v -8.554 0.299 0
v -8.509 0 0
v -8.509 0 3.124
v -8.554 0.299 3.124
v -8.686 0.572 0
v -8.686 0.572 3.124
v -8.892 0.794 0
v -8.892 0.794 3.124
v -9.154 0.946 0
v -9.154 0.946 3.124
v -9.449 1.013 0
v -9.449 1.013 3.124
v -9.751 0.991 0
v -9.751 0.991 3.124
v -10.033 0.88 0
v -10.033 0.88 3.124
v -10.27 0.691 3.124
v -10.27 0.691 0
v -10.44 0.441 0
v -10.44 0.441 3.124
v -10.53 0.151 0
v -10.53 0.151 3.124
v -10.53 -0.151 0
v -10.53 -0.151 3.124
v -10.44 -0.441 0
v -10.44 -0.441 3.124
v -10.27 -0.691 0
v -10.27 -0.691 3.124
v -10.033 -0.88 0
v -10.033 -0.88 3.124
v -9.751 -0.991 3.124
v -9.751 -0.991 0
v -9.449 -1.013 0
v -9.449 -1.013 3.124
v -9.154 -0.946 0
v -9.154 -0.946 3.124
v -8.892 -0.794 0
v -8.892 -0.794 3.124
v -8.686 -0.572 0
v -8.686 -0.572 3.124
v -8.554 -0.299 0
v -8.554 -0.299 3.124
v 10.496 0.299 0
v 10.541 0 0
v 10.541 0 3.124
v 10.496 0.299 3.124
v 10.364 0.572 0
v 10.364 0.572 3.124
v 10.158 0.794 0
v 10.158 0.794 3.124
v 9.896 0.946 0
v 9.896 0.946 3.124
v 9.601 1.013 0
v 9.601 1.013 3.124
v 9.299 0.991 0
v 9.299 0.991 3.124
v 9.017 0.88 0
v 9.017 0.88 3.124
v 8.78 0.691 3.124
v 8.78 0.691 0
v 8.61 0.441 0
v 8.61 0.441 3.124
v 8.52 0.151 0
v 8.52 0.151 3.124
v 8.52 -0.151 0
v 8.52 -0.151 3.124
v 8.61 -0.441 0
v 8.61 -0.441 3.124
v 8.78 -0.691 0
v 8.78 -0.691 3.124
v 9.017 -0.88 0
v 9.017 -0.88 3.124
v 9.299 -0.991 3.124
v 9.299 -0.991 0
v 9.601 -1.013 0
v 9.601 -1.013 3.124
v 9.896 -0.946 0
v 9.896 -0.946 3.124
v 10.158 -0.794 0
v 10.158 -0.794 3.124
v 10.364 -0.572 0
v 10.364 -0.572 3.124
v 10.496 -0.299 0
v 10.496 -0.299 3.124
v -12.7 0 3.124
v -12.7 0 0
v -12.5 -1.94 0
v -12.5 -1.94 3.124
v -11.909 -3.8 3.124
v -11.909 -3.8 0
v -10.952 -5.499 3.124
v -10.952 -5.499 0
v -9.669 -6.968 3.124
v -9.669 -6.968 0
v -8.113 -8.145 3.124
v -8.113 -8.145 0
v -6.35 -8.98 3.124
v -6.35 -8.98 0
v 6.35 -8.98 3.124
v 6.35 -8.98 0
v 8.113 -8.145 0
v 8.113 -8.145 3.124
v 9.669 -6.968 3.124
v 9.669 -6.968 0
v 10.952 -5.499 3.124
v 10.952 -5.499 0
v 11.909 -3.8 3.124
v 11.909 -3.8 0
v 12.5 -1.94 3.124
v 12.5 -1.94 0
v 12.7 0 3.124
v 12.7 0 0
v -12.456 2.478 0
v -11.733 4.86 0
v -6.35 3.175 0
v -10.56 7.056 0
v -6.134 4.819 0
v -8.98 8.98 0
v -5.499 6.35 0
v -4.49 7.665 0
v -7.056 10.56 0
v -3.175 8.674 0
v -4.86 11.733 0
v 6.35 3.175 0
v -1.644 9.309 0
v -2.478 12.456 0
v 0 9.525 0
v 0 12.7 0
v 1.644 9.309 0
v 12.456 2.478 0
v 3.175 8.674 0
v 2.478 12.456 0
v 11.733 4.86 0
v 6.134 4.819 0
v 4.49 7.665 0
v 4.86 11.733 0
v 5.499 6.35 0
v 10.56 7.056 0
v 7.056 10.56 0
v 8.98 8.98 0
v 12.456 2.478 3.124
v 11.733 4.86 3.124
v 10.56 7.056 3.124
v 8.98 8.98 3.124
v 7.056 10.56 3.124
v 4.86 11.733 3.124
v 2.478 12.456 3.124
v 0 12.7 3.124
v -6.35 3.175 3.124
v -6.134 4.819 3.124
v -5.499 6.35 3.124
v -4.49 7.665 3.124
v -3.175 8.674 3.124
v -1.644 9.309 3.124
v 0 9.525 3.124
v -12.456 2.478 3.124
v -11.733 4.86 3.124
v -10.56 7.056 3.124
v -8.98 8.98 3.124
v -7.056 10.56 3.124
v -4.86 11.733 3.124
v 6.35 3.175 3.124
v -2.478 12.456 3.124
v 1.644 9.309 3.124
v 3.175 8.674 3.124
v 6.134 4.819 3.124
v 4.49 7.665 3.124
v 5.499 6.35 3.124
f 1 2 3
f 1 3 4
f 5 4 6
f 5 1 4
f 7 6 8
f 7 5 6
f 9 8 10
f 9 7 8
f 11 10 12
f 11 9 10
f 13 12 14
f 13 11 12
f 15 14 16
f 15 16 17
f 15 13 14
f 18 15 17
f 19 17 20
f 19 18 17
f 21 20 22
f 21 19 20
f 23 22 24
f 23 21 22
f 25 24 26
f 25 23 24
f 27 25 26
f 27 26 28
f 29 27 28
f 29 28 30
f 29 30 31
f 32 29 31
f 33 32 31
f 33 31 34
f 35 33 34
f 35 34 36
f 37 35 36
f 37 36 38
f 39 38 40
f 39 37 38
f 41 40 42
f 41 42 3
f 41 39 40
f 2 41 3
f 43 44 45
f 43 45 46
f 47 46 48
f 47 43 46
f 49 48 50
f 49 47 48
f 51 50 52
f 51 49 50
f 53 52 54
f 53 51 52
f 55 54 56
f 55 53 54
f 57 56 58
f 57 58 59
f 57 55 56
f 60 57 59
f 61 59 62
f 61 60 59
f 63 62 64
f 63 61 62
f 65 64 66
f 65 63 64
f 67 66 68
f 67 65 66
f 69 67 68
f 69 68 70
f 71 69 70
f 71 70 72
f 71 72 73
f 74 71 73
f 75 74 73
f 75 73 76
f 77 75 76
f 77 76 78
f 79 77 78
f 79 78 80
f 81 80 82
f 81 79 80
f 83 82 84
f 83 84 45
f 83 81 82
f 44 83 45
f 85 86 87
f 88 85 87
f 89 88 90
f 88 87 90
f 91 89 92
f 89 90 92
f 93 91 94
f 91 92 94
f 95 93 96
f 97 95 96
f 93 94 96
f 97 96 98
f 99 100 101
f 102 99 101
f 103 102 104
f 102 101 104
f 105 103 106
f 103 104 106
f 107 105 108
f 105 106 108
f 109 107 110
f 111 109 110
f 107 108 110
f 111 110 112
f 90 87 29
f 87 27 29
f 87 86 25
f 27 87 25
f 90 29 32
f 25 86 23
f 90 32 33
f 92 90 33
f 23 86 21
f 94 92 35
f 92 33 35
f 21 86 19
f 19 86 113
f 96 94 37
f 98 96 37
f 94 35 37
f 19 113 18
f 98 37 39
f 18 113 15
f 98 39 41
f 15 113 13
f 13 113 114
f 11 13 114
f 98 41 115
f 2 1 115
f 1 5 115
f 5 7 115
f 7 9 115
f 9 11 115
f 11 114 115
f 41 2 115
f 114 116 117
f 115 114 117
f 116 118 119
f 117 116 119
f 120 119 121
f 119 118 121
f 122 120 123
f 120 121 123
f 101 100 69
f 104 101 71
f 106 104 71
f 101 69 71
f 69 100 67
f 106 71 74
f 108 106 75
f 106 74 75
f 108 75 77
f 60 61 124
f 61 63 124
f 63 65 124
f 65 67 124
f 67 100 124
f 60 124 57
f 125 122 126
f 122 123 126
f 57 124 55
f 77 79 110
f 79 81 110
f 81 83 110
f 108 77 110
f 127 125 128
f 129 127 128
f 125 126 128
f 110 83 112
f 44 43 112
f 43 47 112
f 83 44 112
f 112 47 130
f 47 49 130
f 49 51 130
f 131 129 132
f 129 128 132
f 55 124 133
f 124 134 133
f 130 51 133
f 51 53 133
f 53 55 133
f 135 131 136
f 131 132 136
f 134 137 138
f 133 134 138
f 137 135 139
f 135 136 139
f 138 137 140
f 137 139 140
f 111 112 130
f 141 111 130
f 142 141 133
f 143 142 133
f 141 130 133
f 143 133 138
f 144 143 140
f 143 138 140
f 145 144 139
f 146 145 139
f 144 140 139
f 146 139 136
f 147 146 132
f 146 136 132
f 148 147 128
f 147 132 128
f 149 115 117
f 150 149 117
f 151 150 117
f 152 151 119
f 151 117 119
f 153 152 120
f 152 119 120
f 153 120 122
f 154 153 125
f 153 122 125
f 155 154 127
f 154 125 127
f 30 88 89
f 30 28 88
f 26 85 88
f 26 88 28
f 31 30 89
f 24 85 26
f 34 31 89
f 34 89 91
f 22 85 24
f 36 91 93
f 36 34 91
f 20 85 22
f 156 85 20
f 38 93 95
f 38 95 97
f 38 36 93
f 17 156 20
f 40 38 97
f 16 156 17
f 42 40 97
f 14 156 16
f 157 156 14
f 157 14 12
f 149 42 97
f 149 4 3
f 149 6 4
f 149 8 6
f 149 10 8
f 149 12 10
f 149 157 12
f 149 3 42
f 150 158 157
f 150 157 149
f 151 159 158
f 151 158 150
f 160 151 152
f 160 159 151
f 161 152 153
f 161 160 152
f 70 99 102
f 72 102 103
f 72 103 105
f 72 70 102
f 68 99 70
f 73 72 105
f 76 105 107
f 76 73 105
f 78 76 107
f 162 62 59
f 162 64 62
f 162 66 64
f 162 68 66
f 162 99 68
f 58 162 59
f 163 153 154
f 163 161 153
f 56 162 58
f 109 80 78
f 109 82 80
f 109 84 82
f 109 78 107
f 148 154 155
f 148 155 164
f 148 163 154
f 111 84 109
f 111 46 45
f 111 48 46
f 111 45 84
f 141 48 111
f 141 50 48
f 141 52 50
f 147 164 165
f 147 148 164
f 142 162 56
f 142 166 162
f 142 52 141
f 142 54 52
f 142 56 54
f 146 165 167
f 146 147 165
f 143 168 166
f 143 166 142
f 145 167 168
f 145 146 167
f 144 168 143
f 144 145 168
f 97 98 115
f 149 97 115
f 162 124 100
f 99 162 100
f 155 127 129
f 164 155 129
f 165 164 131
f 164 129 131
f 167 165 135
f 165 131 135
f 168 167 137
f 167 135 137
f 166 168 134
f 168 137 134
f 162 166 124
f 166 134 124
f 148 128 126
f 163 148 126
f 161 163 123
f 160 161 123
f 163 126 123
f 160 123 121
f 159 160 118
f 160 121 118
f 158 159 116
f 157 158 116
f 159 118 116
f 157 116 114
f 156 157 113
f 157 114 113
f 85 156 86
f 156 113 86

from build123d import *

# Parameters (mm, degrees)
CROQUIS1_R              = 1.016
SALIENTE_EXTRUIR1_DEPTH = 3.1242


with BuildPart() as part:
    # Croquis1 → Saliente-Extruir1 (new body)
    with BuildSketch(Plane.XY):
        with BuildLine():
            Line((-1.7e-08, 9.525), (-3.175, 9.525))
            ThreePointArc((-3.175, 9.525), (-9.910192091, 6.735192091), (-12.7, 0))
            ThreePointArc((-12.7, 0), (-10.952129933, -5.499261314), (-6.35, -8.980256121))
            Line((-6.35, -8.980256121), (-6.35, -3.175))
            Line((-6.35, -3.175), (-6.35, 3.175))
            ThreePointArc((-6.35, 3.175), (-4.490128067, 7.665128054), (-1.7e-08, 9.525))
        make_face()
        with Locations((-9.525, 0)):
            Circle(CROQUIS1_R, mode=Mode.SUBTRACT)
        with BuildLine():
            ThreePointArc((-12.7, 0), (-9.910192091, 6.735192091), (-3.175, 9.525))
            Line((-3.175, 9.525), (-1.7e-08, 9.525))
            Line((-1.7e-08, 9.525), (3.175, 9.525))
            ThreePointArc((3.175, 9.525), (9.910192091, 6.735192091), (12.7, 0))
            ThreePointArc((12.7, 0), (8.980256121, 8.980256121), (0, 12.7))
            ThreePointArc((0, 12.7), (-8.980256121, 8.980256121), (-12.7, 0))
        make_face()
        with BuildLine():
            Line((3.175, 9.525), (-1.7e-08, 9.525))
            ThreePointArc((-1.7e-08, 9.525), (4.490128054, 7.665128067), (6.35, 3.175))
            Line((6.35, 3.175), (6.35, -3.175))
            Line((6.35, -3.175), (6.35, -8.980256121))
            ThreePointArc((6.35, -8.980256121), (10.952129933, -5.499261314), (12.7, 0))
            ThreePointArc((12.7, 0), (9.910192091, 6.735192091), (3.175, 9.525))
        make_face()
        with Locations((9.525, 0)):
            Circle(CROQUIS1_R, mode=Mode.SUBTRACT)
    extrude(amount=SALIENTE_EXTRUIR1_DEPTH)


solid = part.part
